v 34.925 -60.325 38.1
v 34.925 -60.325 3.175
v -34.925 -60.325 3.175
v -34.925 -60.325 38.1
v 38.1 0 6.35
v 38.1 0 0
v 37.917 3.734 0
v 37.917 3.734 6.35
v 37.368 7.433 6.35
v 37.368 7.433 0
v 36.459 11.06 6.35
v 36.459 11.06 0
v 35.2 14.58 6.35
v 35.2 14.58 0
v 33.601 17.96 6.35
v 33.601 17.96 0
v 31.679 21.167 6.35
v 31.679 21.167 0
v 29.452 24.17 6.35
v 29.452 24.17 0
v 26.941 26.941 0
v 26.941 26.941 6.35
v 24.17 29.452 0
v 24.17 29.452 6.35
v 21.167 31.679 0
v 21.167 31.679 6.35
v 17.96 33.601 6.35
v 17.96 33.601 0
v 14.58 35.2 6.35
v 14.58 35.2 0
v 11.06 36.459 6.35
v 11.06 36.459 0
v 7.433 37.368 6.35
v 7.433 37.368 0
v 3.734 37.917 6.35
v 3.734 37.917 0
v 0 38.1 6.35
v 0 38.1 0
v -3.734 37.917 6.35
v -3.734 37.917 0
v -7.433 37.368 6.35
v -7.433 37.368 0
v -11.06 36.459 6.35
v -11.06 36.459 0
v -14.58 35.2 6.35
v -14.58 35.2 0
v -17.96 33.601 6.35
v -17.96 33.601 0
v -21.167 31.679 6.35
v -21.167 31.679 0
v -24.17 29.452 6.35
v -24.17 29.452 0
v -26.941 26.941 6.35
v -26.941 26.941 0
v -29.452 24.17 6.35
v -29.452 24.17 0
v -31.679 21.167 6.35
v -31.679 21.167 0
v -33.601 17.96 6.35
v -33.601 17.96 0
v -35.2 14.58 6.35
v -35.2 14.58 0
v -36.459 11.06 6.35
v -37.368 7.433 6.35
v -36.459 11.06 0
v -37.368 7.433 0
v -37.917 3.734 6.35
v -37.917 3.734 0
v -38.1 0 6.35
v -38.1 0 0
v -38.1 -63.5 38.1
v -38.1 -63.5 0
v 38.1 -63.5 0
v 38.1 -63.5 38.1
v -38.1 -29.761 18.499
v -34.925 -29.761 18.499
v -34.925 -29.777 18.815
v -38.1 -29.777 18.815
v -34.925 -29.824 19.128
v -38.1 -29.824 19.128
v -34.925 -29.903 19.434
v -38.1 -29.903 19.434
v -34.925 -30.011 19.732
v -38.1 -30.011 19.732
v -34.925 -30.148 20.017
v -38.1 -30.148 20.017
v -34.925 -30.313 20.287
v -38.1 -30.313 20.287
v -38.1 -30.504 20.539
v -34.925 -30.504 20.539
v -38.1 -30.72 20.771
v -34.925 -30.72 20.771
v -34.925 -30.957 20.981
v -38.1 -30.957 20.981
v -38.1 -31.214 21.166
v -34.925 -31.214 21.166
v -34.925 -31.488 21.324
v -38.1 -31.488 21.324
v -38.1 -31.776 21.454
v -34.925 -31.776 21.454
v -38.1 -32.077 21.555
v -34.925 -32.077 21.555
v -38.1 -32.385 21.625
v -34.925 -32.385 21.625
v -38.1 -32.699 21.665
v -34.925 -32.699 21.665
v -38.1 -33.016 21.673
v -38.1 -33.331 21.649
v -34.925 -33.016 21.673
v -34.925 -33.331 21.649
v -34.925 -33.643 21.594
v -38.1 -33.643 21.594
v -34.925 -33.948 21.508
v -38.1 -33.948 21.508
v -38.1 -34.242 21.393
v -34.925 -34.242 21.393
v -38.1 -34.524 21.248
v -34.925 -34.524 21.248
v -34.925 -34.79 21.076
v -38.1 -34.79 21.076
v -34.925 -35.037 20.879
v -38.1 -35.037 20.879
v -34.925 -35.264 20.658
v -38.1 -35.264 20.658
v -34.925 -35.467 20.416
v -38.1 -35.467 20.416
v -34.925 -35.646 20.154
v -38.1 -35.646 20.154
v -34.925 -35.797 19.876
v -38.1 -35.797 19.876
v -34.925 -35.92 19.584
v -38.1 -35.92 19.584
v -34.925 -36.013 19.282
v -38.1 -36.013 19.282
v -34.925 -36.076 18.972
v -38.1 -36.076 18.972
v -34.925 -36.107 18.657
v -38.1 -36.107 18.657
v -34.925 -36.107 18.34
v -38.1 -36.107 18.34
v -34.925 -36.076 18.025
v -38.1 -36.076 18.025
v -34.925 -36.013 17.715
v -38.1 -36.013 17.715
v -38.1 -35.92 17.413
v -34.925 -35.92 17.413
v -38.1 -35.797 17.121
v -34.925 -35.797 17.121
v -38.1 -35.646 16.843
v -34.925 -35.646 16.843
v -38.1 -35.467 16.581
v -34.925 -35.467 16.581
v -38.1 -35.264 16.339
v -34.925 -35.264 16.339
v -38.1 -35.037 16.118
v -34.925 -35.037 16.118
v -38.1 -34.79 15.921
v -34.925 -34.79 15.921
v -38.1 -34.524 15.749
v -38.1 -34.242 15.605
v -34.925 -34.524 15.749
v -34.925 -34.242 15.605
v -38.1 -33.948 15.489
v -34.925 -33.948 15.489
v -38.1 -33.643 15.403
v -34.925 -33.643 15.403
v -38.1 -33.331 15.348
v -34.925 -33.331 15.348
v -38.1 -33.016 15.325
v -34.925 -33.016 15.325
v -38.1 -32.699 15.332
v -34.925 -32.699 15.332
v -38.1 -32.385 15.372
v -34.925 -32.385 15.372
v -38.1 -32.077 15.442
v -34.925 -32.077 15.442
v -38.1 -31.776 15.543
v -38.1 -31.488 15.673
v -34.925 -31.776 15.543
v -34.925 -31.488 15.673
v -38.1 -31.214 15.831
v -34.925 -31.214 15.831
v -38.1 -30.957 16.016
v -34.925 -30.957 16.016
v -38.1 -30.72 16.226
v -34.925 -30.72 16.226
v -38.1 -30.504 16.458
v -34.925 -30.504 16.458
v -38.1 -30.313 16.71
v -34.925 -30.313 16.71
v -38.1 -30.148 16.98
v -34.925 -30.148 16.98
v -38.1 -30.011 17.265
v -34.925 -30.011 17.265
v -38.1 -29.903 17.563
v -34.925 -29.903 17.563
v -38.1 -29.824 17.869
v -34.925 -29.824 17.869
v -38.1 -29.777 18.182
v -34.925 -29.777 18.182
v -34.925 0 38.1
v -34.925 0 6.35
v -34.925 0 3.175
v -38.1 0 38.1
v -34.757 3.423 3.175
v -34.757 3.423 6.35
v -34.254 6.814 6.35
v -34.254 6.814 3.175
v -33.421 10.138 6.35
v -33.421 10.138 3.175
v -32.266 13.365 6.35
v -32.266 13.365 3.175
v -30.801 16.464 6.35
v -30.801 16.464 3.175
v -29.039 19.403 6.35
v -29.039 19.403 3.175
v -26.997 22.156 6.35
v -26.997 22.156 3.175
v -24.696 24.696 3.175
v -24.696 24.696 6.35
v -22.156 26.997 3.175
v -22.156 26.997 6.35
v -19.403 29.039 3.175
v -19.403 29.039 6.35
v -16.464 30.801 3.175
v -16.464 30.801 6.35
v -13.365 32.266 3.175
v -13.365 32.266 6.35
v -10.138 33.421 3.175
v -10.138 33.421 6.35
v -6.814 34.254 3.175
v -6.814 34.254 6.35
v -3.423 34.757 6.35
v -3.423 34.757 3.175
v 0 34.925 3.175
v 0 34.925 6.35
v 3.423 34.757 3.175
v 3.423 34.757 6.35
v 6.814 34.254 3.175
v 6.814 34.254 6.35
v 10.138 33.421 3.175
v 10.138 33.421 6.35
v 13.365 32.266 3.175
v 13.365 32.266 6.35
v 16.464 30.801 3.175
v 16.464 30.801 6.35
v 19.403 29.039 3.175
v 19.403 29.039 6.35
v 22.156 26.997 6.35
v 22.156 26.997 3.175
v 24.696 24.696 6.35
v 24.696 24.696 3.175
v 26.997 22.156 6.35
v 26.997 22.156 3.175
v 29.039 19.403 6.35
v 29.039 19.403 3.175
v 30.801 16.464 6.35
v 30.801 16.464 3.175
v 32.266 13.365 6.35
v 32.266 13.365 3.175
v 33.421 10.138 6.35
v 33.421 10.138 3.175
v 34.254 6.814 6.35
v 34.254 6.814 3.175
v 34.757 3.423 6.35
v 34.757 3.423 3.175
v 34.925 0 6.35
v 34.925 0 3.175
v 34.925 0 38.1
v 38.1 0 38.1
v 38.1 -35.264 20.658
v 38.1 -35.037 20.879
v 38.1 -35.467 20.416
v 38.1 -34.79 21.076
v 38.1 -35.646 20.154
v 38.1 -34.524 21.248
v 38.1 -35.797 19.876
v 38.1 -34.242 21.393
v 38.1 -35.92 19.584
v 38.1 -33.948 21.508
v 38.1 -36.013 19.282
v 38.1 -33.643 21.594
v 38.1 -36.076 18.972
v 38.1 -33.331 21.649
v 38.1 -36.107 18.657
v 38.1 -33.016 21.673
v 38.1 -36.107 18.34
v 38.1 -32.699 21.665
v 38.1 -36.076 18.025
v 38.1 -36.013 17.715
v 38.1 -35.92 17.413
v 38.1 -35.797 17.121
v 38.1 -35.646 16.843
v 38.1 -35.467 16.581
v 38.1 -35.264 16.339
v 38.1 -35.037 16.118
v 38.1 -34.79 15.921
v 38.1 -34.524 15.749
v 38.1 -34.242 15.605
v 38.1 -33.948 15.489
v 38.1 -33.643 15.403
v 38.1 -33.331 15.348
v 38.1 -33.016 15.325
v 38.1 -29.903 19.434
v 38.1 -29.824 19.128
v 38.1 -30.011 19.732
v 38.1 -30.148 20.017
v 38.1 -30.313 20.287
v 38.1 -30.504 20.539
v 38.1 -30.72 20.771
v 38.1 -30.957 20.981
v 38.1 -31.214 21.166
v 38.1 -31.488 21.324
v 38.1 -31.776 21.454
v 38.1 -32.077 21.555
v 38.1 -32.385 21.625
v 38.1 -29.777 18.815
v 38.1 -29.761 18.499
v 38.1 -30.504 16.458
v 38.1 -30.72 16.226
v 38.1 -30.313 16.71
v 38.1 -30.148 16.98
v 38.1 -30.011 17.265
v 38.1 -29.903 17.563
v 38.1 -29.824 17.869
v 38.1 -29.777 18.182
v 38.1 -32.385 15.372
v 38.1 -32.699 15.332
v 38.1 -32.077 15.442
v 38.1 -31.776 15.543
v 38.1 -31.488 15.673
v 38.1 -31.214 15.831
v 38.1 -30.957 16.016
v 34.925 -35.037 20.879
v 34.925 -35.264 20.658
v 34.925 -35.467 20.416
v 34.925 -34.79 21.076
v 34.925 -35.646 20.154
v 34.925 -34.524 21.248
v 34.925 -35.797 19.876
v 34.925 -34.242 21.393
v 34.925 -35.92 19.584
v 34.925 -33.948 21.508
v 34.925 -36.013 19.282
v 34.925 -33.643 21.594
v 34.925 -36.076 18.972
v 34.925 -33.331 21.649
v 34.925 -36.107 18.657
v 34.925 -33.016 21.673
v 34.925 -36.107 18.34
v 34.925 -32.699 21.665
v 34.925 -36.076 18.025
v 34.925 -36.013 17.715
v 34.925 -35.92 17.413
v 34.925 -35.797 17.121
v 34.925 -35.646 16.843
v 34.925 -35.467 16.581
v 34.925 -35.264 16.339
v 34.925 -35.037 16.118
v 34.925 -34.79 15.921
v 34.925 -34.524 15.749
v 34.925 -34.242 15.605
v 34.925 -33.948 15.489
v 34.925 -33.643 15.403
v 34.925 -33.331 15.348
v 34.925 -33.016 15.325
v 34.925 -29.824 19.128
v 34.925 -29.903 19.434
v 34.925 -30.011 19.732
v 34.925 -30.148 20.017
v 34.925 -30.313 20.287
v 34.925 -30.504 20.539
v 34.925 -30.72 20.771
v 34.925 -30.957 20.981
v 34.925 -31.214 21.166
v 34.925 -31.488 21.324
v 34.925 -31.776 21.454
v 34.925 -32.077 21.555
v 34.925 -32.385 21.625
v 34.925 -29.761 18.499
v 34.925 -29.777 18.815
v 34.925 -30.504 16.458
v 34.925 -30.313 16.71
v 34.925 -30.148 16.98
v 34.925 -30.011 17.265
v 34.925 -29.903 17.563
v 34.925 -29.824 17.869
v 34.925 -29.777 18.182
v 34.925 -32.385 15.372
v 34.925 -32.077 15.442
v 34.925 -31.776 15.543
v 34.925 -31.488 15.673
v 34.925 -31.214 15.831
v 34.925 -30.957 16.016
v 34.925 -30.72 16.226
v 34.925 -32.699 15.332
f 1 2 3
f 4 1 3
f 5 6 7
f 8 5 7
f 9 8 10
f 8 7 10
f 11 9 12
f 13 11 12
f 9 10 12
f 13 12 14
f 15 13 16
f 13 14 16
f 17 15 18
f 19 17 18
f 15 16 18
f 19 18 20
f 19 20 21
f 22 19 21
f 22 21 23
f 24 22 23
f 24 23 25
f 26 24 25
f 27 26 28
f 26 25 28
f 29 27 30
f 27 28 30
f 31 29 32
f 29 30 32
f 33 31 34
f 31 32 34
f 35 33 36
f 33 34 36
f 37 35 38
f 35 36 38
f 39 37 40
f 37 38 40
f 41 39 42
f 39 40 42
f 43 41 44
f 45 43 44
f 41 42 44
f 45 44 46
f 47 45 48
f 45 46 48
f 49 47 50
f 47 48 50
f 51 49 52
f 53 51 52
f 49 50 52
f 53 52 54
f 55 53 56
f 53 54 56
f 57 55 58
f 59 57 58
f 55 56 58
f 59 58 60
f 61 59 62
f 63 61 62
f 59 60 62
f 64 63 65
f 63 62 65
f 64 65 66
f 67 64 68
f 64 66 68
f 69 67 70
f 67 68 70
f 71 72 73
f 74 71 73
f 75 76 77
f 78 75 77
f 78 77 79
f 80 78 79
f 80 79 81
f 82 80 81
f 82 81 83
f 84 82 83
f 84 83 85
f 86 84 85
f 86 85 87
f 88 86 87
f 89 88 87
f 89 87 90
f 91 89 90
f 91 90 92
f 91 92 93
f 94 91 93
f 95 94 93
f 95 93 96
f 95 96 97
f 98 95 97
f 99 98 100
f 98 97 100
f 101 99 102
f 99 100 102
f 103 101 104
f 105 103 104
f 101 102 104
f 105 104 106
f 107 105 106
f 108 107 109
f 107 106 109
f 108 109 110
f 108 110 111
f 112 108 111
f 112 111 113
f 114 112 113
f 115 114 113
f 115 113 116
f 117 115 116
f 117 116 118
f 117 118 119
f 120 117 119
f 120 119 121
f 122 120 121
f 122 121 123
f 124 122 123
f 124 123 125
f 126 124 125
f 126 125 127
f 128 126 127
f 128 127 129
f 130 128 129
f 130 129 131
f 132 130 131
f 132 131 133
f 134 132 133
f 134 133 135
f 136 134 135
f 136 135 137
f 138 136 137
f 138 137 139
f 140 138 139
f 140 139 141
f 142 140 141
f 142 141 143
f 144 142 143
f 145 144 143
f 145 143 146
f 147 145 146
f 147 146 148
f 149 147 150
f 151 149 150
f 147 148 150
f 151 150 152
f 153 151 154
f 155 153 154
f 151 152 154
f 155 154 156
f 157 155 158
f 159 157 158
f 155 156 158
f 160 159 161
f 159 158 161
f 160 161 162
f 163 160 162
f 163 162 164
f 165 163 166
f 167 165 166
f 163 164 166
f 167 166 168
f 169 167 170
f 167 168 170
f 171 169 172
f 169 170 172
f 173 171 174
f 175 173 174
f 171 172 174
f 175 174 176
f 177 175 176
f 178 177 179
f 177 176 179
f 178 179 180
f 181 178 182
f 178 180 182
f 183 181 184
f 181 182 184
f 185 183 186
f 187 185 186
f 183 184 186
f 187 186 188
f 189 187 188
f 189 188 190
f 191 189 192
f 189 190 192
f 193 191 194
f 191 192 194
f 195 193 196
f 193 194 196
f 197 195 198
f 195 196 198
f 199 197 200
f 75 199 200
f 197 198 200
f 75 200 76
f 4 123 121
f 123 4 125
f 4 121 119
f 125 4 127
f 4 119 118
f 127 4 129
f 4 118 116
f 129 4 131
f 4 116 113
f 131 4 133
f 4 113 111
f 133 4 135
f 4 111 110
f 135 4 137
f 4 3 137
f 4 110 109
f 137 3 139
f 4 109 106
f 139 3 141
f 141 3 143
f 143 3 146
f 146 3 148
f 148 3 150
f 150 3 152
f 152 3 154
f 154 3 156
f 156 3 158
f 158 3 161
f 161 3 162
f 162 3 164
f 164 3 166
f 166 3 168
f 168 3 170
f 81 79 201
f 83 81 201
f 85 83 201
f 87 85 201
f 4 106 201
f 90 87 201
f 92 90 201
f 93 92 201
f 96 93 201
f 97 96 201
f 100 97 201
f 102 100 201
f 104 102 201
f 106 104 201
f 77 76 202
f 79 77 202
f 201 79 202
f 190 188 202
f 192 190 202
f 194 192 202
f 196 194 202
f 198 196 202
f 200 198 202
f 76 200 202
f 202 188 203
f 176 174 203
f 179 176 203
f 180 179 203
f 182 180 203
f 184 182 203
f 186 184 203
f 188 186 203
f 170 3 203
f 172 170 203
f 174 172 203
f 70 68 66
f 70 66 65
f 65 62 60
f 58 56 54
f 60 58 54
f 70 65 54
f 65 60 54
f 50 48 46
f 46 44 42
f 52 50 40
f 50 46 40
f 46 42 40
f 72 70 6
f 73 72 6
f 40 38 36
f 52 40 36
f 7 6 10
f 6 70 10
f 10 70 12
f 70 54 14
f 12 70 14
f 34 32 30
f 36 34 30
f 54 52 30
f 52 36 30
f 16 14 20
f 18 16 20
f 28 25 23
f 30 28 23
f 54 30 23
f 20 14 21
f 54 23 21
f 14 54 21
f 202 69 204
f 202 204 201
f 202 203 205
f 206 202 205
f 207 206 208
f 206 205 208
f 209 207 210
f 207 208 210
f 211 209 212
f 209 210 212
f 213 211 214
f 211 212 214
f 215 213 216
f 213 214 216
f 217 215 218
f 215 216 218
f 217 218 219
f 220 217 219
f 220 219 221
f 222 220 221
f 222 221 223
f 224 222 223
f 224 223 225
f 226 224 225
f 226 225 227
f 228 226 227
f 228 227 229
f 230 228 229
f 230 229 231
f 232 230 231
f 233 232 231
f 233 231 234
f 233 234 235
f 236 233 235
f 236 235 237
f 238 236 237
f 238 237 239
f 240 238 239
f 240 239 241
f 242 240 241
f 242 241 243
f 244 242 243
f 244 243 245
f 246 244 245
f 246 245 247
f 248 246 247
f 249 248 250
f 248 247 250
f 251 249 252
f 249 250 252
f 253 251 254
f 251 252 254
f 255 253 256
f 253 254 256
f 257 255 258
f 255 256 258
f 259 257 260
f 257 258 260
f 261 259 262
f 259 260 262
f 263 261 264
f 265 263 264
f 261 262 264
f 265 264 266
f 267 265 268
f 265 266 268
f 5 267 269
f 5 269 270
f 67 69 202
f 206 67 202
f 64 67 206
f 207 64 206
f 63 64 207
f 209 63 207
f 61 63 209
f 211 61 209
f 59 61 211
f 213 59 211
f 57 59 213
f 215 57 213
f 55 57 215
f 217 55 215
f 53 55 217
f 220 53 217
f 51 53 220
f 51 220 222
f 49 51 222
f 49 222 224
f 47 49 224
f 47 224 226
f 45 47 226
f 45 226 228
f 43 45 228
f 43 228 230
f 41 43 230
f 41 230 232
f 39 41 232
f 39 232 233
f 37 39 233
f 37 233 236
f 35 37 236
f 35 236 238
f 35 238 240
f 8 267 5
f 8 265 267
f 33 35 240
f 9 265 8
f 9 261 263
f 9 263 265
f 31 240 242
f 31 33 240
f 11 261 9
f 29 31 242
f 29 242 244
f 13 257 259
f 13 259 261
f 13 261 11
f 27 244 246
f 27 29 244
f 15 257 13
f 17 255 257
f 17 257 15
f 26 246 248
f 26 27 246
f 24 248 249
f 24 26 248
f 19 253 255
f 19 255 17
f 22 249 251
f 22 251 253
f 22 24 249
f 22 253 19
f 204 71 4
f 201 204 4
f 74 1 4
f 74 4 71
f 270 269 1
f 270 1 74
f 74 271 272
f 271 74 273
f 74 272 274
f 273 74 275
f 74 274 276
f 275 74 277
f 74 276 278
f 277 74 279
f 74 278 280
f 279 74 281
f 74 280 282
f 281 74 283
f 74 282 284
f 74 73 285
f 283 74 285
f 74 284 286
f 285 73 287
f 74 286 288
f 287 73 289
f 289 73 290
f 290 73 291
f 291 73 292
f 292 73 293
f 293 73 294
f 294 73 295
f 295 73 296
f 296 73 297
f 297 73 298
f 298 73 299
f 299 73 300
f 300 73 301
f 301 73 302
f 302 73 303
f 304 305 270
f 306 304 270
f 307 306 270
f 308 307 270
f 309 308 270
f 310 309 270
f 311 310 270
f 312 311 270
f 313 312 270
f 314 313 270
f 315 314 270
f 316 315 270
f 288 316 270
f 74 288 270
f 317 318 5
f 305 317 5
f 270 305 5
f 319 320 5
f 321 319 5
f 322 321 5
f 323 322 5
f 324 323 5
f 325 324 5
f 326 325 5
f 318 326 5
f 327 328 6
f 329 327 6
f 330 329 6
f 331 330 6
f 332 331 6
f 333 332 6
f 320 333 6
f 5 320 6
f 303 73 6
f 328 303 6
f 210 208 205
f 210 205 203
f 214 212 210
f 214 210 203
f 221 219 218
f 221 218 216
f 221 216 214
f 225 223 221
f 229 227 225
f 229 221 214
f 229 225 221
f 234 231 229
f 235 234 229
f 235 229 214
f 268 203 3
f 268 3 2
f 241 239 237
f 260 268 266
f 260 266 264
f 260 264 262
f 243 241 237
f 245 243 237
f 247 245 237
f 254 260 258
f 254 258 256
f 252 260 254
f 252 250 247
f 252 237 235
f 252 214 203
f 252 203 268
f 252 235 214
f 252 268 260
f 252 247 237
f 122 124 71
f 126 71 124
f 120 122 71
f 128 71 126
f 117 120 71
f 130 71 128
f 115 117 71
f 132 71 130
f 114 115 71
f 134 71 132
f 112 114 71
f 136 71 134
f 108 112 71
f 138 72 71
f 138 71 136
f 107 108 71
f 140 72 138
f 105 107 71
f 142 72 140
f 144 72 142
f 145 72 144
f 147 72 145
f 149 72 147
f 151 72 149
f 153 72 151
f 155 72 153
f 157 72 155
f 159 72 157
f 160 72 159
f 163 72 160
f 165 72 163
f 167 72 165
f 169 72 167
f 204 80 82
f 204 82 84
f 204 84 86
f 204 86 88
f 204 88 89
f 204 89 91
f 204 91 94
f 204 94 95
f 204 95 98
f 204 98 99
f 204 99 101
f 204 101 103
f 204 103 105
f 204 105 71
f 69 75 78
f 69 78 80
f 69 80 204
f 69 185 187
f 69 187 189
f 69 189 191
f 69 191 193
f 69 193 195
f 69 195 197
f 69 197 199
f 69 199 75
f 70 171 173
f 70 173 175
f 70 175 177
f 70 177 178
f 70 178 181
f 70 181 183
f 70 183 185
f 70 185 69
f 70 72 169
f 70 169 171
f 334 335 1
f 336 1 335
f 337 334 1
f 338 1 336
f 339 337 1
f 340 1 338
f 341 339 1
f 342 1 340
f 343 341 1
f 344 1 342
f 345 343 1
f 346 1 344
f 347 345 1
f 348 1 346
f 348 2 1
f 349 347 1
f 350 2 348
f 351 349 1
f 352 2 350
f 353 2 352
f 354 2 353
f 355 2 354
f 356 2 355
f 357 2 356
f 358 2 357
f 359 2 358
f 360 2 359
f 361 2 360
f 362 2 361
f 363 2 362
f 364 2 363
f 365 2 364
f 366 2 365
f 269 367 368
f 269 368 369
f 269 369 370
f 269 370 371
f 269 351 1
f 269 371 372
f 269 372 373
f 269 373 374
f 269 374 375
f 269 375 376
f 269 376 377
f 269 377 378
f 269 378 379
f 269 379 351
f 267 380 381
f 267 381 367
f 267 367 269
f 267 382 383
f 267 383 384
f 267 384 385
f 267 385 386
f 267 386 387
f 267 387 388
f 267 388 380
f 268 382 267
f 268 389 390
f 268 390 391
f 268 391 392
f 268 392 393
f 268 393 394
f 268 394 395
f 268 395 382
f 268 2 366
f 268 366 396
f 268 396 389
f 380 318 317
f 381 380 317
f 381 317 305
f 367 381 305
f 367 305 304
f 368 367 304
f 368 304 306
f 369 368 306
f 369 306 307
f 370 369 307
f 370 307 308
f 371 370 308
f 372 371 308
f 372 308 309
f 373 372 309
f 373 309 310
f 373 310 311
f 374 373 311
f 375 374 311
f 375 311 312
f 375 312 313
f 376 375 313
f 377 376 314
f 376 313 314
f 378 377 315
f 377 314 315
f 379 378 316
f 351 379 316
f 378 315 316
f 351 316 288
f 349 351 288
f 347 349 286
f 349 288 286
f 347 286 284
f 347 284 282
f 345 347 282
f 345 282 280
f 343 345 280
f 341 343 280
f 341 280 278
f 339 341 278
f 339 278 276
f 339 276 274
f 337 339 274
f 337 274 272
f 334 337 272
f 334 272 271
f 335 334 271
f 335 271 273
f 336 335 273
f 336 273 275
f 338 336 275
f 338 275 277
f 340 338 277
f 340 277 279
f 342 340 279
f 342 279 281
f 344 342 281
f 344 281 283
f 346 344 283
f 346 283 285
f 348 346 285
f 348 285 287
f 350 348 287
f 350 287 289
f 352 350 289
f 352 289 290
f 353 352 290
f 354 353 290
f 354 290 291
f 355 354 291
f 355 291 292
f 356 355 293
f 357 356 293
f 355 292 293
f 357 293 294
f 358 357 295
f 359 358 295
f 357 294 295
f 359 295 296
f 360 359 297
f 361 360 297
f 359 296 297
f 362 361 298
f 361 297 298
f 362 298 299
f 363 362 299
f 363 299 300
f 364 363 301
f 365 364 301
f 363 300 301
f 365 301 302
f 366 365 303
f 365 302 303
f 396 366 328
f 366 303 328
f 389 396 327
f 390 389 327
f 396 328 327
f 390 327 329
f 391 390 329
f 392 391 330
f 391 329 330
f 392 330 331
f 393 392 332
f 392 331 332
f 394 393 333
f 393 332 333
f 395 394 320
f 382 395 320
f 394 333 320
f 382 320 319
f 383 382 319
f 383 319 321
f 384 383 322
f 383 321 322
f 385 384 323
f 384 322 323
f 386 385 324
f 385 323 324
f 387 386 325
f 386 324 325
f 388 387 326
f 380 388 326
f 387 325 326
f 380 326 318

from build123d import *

# Parameters (mm, degrees)
F1_DEPTH = 3.175
F2_DEPTH = 6.35
F3_DEPTH = 38.1
F0_W     = 3.175
F0_H     = 60.325
F4_DEPTH = 38.1
F5_DEPTH = 38.1
F6_R     = 3.175
F7_DEPTH = 76.2


with BuildPart() as f1:
    # F0 (on Top) → F1 (new body)
    with BuildSketch(Plane.XY):
        with BuildLine():
            Line((34.925, -60.325), (34.925, 0))
            ThreePointArc((34.925, 0), (0, 34.925), (-34.925, 0))
            Line((-34.925, 0), (-34.925, -60.325))
            Line((-34.925, -60.325), (34.925, -60.325))
        make_face()
    extrude(amount=F1_DEPTH)

    # F0 (on Top) → F2 (join)
    with BuildSketch(Plane.XY):
        with BuildLine():
            Line((34.925, 0), (38.1, 0))
            ThreePointArc((38.1, 0), (0, 38.1), (-38.1, 0))
            Line((-38.1, 0), (-34.925, 0))
            ThreePointArc((-34.925, 0), (0, 34.925), (34.925, 0))
        make_face()
    extrude(amount=F2_DEPTH)

    # F0 (on Top) → F3 (join)
    with BuildSketch(Plane.XY):
        Polygon((38.1, -63.5), (38.1, -60.325), (34.925, -60.325), (-34.925, -60.325), (-38.1, -60.325), (-38.1, -63.5), align=None)
    extrude(amount=F3_DEPTH)

    # F0 (on Top) → F4 (join)
    with BuildSketch(Plane.XY):
        with Locations((-36.5125, -30.1625)):
            Rectangle(F0_W, F0_H)
    extrude(amount=F4_DEPTH)

    # F0 (on Top) → F5 (join)
    with BuildSketch(Plane.XY):
        with Locations((36.5125, -30.1625)):
            Rectangle(F0_W, F0_H)
    extrude(amount=F5_DEPTH)

    # F6 (on face) → F7 (cut)
    with BuildSketch(Plane.YZ.offset(38.1)):
        with Locations((-32.936446, 18.498553)):
            Circle(F6_R)
    extrude(amount=-F7_DEPTH, mode=Mode.SUBTRACT)


solid = f1.part
